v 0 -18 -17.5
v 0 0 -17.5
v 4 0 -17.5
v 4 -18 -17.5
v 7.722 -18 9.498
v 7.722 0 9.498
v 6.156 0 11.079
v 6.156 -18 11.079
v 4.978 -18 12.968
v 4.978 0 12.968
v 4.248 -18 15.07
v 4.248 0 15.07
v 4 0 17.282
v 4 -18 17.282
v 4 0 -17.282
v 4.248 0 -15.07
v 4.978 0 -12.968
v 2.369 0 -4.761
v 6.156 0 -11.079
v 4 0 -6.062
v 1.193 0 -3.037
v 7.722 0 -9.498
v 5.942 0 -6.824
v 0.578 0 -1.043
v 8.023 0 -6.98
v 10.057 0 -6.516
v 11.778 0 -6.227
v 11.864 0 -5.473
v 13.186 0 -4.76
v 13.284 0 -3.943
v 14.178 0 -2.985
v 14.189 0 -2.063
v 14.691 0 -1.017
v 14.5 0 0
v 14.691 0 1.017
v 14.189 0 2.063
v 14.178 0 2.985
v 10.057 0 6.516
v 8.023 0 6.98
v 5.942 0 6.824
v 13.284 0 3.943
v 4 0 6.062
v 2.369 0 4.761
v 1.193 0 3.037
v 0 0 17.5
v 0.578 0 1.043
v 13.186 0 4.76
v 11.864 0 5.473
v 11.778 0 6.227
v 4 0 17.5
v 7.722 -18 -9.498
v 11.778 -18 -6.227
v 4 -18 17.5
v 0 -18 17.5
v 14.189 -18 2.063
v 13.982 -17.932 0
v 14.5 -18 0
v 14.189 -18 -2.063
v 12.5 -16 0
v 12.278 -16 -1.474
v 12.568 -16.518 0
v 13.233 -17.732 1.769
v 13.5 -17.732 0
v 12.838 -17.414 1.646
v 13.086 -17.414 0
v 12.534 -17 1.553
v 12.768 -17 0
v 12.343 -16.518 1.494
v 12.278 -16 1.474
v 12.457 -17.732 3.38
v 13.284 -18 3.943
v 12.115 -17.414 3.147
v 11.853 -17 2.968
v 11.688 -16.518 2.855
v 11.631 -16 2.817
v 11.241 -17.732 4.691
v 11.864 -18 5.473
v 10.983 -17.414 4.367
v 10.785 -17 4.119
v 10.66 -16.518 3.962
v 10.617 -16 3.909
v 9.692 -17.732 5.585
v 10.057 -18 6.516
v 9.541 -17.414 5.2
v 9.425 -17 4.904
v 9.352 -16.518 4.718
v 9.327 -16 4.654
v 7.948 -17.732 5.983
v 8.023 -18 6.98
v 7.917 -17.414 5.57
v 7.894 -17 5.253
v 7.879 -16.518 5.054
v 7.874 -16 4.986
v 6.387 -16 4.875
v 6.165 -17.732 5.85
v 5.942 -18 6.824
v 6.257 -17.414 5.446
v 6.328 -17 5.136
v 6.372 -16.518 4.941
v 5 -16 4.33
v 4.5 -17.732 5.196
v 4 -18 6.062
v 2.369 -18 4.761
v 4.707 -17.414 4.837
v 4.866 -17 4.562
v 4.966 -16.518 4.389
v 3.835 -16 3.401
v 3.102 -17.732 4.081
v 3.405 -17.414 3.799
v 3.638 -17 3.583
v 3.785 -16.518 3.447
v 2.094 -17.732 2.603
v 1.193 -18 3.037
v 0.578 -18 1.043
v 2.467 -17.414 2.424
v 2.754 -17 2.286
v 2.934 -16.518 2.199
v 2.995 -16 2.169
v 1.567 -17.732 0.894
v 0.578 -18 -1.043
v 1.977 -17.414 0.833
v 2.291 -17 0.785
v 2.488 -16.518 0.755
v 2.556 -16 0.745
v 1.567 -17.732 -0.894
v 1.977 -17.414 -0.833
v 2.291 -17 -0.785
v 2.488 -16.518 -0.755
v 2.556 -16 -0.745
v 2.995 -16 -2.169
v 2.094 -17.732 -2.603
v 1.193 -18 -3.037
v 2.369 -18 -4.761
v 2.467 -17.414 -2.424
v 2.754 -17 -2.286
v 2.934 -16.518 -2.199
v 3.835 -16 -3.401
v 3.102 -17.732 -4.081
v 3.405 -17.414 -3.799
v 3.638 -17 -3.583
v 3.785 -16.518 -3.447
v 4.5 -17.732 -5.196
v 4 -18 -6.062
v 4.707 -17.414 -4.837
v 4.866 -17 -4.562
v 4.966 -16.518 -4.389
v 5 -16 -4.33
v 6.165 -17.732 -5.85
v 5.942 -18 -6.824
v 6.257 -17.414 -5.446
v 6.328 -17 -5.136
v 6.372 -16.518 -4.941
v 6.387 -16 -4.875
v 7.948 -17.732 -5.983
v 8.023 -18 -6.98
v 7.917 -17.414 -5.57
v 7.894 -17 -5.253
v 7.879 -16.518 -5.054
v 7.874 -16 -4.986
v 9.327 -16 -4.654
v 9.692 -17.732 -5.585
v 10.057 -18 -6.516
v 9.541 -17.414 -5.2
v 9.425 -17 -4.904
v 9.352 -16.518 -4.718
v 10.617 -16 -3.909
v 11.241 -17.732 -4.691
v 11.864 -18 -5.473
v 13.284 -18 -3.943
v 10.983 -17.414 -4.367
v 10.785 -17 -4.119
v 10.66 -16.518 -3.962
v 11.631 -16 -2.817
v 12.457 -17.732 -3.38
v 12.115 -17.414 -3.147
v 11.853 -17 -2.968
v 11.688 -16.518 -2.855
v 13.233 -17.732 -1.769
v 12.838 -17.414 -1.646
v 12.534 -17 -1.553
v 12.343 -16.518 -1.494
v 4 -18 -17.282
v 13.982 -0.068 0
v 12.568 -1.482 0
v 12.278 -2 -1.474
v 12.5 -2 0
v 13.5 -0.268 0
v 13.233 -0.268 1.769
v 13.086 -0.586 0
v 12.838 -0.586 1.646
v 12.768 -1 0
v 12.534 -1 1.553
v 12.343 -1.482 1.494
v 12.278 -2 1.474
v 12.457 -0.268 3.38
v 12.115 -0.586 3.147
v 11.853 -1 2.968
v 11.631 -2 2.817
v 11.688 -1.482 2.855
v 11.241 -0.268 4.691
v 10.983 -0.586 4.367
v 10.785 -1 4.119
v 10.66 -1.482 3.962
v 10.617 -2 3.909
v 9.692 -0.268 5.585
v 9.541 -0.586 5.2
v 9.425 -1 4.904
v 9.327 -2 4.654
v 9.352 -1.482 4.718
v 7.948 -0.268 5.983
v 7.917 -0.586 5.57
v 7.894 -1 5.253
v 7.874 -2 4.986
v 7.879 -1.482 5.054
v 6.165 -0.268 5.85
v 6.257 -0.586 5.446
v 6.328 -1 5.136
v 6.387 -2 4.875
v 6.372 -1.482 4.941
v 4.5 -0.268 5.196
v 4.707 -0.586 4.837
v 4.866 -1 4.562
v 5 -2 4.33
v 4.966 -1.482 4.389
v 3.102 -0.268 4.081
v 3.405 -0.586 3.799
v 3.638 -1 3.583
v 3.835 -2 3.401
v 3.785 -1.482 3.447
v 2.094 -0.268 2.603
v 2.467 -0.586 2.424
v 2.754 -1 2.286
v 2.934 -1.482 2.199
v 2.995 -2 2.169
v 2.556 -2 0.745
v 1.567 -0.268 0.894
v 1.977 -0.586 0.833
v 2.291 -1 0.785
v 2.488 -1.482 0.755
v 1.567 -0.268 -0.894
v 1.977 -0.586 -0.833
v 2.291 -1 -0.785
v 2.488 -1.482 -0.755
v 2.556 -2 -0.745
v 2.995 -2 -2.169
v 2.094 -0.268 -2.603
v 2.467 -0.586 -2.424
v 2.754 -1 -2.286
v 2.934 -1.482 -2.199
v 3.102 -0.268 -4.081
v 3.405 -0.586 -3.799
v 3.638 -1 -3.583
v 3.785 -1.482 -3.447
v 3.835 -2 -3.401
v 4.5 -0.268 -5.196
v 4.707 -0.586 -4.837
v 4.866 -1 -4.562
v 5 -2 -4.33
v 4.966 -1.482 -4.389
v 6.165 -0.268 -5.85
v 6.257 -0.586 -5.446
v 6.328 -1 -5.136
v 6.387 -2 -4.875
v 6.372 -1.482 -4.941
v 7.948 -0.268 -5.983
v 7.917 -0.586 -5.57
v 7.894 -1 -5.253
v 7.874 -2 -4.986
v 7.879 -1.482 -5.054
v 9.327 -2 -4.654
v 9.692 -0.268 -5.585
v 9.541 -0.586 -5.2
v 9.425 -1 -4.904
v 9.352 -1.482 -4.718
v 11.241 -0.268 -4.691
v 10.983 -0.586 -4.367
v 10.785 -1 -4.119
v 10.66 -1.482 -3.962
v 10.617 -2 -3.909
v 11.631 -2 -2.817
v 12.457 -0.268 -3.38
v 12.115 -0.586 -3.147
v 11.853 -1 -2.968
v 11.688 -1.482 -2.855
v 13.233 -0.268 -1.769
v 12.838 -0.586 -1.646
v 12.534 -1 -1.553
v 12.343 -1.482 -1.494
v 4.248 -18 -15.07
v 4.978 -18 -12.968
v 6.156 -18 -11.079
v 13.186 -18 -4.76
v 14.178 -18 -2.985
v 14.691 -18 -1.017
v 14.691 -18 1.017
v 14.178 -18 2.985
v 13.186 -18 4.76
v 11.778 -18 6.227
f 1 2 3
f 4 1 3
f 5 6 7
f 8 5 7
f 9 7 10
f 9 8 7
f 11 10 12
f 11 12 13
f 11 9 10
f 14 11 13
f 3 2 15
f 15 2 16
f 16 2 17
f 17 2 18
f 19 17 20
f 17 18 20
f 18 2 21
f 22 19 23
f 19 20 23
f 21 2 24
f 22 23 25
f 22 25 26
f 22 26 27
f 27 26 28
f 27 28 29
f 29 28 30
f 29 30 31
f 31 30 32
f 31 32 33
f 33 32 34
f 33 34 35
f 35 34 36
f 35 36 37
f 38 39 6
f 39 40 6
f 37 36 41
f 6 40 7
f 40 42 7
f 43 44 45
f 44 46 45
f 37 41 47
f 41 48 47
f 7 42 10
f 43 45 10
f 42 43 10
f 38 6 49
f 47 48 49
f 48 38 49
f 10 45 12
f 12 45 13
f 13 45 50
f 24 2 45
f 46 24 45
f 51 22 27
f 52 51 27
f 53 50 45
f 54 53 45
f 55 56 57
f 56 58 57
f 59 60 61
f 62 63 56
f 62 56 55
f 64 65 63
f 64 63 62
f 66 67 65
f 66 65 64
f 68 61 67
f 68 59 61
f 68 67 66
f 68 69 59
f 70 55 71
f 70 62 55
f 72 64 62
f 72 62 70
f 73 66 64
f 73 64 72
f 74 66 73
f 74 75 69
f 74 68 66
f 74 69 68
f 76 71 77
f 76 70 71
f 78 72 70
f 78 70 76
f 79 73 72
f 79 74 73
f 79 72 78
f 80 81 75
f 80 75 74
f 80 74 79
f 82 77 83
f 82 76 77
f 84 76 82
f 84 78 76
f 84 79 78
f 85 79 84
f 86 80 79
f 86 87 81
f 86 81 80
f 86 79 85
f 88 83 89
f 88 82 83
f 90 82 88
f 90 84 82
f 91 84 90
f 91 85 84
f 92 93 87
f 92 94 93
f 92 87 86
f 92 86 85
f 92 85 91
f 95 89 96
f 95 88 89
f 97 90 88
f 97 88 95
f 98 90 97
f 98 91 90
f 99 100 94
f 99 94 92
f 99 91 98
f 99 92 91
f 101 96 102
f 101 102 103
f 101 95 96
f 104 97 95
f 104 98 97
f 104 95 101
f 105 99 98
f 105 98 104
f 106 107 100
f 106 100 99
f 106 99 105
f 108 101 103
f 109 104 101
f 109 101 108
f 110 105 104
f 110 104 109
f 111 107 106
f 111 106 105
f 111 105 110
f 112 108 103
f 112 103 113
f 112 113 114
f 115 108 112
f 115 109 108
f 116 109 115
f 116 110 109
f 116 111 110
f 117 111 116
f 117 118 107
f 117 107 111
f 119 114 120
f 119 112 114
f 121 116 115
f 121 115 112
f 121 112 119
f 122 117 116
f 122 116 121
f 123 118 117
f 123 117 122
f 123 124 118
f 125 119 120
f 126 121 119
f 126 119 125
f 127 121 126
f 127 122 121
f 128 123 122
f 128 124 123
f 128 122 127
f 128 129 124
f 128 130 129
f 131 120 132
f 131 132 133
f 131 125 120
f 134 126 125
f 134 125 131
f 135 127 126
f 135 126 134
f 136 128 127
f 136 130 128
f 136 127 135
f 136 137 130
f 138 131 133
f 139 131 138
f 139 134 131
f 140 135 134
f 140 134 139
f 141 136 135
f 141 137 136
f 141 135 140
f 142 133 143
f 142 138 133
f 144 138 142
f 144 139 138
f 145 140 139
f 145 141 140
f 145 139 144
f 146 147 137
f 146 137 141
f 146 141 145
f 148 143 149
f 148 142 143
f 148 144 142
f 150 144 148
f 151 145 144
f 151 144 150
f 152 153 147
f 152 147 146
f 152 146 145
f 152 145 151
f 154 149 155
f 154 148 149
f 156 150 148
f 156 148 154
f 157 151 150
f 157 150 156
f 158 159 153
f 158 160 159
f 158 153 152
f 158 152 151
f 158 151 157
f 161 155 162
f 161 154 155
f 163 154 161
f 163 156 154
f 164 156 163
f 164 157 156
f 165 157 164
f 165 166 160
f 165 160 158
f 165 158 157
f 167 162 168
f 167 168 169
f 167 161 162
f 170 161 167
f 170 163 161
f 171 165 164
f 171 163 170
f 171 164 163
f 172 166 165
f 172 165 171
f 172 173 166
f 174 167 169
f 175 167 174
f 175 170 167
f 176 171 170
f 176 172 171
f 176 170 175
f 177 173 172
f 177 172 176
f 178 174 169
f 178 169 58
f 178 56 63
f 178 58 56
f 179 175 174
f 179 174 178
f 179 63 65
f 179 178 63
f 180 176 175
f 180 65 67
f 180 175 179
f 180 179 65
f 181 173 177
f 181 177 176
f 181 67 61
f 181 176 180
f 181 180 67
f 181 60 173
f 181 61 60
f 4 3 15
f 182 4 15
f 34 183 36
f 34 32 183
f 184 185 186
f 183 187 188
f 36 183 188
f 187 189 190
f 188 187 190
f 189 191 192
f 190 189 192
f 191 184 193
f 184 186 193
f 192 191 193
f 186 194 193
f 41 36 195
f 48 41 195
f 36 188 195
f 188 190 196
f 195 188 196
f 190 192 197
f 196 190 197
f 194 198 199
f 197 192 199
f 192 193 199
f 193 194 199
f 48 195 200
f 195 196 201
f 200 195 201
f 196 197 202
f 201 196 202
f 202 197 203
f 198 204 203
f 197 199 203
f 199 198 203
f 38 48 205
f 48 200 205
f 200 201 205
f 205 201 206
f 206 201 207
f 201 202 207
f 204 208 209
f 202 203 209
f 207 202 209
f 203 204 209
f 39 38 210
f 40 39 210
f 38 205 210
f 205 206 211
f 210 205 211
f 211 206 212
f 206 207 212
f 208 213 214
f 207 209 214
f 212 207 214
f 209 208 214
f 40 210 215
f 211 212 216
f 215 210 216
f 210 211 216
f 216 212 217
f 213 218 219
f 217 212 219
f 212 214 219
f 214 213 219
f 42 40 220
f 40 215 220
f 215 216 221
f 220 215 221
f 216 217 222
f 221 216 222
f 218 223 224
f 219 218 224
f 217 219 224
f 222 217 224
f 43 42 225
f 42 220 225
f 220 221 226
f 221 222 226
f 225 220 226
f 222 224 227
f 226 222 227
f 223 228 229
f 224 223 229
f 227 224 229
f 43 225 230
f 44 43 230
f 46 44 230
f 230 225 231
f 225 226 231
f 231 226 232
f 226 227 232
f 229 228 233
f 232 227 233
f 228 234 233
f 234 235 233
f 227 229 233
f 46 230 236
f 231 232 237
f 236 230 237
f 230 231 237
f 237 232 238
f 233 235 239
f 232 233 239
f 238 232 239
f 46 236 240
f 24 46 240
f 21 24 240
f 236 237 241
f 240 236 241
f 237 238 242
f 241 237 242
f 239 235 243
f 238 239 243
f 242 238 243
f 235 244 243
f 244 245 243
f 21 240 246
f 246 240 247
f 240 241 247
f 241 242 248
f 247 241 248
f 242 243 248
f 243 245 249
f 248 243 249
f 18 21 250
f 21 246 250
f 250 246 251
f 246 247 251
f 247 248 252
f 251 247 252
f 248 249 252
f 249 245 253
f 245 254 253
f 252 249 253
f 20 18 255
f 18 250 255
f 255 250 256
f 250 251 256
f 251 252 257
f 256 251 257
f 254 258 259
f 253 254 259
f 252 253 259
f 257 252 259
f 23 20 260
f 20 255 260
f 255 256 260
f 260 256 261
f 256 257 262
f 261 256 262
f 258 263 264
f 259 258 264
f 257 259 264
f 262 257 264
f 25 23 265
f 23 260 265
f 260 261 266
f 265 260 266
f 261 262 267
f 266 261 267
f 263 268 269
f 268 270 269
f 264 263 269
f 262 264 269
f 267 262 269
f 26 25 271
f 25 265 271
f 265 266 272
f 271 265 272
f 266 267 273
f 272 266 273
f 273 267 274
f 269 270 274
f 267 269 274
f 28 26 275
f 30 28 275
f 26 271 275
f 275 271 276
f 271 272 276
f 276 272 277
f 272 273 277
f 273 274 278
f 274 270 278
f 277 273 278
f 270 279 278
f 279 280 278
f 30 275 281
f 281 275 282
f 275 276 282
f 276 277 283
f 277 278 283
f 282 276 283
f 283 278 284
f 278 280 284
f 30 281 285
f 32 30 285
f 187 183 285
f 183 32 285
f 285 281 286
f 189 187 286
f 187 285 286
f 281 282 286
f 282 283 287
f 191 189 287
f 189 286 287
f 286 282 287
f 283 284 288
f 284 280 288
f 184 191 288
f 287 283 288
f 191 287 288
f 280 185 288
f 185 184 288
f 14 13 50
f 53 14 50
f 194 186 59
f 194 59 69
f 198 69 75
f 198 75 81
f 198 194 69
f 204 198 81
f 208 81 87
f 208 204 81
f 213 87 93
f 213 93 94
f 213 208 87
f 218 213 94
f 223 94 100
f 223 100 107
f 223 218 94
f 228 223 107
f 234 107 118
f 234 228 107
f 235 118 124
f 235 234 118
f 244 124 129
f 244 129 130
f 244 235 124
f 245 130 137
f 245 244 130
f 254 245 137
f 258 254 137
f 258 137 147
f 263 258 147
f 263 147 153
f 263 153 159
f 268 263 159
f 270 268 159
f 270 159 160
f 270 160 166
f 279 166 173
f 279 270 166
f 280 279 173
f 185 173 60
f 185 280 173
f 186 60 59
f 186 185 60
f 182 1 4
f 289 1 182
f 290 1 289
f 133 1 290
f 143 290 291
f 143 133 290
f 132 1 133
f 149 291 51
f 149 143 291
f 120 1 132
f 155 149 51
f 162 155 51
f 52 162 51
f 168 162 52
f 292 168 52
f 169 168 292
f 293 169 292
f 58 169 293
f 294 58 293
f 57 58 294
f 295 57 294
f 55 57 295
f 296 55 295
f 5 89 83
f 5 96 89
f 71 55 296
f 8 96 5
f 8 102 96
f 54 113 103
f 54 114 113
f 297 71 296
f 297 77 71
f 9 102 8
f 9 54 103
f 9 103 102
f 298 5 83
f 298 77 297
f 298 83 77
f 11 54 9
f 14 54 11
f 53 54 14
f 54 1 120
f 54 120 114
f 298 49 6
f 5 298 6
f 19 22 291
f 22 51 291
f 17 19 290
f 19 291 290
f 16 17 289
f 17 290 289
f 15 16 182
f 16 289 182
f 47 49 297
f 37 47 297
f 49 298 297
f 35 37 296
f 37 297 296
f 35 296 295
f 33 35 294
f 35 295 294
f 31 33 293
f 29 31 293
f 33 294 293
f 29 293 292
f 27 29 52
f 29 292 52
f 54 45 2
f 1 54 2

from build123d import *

# Parameters (mm, degrees)
SKETCH_R    = 5
PAD_DEPTH   = 18
FILLET_R    = 8
FILLET001_R = 10
FILLET002_R = 2


with BuildPart() as part:
    # Sketch → Pad (new body)
    with BuildSketch(Plane.XZ):
        Polygon((4, 17.5), (0, 17.5), (0, -17.5), (4, -17.5), (4, -12.5), (19.5, 0), (4, 12.5), align=None)
        with Locations((7.5, 0)):
            Circle(SKETCH_R, mode=Mode.SUBTRACT)
    extrude(amount=PAD_DEPTH)

    # Fillet
    fillet_edges = [part.edges().sort_by_distance(p)[0] for p in [
        (19.5, -9, 0),
    ]]
    fillet(fillet_edges, radius=FILLET_R)

    # Fillet001
    fillet001_edges = [part.edges().sort_by_distance(p)[0] for p in [
        (4, -9, -12.5),
        (4, -9, 12.5),
    ]]
    fillet(fillet001_edges, radius=FILLET001_R)

    # Fillet002
    fillet002_edges = [part.edges().sort_by_distance(p)[0] for p in [
        (2.5, -18, 0),
        (2.5, 0, 0),
    ]]
    fillet(fillet002_edges, radius=FILLET002_R)


solid = part.part
